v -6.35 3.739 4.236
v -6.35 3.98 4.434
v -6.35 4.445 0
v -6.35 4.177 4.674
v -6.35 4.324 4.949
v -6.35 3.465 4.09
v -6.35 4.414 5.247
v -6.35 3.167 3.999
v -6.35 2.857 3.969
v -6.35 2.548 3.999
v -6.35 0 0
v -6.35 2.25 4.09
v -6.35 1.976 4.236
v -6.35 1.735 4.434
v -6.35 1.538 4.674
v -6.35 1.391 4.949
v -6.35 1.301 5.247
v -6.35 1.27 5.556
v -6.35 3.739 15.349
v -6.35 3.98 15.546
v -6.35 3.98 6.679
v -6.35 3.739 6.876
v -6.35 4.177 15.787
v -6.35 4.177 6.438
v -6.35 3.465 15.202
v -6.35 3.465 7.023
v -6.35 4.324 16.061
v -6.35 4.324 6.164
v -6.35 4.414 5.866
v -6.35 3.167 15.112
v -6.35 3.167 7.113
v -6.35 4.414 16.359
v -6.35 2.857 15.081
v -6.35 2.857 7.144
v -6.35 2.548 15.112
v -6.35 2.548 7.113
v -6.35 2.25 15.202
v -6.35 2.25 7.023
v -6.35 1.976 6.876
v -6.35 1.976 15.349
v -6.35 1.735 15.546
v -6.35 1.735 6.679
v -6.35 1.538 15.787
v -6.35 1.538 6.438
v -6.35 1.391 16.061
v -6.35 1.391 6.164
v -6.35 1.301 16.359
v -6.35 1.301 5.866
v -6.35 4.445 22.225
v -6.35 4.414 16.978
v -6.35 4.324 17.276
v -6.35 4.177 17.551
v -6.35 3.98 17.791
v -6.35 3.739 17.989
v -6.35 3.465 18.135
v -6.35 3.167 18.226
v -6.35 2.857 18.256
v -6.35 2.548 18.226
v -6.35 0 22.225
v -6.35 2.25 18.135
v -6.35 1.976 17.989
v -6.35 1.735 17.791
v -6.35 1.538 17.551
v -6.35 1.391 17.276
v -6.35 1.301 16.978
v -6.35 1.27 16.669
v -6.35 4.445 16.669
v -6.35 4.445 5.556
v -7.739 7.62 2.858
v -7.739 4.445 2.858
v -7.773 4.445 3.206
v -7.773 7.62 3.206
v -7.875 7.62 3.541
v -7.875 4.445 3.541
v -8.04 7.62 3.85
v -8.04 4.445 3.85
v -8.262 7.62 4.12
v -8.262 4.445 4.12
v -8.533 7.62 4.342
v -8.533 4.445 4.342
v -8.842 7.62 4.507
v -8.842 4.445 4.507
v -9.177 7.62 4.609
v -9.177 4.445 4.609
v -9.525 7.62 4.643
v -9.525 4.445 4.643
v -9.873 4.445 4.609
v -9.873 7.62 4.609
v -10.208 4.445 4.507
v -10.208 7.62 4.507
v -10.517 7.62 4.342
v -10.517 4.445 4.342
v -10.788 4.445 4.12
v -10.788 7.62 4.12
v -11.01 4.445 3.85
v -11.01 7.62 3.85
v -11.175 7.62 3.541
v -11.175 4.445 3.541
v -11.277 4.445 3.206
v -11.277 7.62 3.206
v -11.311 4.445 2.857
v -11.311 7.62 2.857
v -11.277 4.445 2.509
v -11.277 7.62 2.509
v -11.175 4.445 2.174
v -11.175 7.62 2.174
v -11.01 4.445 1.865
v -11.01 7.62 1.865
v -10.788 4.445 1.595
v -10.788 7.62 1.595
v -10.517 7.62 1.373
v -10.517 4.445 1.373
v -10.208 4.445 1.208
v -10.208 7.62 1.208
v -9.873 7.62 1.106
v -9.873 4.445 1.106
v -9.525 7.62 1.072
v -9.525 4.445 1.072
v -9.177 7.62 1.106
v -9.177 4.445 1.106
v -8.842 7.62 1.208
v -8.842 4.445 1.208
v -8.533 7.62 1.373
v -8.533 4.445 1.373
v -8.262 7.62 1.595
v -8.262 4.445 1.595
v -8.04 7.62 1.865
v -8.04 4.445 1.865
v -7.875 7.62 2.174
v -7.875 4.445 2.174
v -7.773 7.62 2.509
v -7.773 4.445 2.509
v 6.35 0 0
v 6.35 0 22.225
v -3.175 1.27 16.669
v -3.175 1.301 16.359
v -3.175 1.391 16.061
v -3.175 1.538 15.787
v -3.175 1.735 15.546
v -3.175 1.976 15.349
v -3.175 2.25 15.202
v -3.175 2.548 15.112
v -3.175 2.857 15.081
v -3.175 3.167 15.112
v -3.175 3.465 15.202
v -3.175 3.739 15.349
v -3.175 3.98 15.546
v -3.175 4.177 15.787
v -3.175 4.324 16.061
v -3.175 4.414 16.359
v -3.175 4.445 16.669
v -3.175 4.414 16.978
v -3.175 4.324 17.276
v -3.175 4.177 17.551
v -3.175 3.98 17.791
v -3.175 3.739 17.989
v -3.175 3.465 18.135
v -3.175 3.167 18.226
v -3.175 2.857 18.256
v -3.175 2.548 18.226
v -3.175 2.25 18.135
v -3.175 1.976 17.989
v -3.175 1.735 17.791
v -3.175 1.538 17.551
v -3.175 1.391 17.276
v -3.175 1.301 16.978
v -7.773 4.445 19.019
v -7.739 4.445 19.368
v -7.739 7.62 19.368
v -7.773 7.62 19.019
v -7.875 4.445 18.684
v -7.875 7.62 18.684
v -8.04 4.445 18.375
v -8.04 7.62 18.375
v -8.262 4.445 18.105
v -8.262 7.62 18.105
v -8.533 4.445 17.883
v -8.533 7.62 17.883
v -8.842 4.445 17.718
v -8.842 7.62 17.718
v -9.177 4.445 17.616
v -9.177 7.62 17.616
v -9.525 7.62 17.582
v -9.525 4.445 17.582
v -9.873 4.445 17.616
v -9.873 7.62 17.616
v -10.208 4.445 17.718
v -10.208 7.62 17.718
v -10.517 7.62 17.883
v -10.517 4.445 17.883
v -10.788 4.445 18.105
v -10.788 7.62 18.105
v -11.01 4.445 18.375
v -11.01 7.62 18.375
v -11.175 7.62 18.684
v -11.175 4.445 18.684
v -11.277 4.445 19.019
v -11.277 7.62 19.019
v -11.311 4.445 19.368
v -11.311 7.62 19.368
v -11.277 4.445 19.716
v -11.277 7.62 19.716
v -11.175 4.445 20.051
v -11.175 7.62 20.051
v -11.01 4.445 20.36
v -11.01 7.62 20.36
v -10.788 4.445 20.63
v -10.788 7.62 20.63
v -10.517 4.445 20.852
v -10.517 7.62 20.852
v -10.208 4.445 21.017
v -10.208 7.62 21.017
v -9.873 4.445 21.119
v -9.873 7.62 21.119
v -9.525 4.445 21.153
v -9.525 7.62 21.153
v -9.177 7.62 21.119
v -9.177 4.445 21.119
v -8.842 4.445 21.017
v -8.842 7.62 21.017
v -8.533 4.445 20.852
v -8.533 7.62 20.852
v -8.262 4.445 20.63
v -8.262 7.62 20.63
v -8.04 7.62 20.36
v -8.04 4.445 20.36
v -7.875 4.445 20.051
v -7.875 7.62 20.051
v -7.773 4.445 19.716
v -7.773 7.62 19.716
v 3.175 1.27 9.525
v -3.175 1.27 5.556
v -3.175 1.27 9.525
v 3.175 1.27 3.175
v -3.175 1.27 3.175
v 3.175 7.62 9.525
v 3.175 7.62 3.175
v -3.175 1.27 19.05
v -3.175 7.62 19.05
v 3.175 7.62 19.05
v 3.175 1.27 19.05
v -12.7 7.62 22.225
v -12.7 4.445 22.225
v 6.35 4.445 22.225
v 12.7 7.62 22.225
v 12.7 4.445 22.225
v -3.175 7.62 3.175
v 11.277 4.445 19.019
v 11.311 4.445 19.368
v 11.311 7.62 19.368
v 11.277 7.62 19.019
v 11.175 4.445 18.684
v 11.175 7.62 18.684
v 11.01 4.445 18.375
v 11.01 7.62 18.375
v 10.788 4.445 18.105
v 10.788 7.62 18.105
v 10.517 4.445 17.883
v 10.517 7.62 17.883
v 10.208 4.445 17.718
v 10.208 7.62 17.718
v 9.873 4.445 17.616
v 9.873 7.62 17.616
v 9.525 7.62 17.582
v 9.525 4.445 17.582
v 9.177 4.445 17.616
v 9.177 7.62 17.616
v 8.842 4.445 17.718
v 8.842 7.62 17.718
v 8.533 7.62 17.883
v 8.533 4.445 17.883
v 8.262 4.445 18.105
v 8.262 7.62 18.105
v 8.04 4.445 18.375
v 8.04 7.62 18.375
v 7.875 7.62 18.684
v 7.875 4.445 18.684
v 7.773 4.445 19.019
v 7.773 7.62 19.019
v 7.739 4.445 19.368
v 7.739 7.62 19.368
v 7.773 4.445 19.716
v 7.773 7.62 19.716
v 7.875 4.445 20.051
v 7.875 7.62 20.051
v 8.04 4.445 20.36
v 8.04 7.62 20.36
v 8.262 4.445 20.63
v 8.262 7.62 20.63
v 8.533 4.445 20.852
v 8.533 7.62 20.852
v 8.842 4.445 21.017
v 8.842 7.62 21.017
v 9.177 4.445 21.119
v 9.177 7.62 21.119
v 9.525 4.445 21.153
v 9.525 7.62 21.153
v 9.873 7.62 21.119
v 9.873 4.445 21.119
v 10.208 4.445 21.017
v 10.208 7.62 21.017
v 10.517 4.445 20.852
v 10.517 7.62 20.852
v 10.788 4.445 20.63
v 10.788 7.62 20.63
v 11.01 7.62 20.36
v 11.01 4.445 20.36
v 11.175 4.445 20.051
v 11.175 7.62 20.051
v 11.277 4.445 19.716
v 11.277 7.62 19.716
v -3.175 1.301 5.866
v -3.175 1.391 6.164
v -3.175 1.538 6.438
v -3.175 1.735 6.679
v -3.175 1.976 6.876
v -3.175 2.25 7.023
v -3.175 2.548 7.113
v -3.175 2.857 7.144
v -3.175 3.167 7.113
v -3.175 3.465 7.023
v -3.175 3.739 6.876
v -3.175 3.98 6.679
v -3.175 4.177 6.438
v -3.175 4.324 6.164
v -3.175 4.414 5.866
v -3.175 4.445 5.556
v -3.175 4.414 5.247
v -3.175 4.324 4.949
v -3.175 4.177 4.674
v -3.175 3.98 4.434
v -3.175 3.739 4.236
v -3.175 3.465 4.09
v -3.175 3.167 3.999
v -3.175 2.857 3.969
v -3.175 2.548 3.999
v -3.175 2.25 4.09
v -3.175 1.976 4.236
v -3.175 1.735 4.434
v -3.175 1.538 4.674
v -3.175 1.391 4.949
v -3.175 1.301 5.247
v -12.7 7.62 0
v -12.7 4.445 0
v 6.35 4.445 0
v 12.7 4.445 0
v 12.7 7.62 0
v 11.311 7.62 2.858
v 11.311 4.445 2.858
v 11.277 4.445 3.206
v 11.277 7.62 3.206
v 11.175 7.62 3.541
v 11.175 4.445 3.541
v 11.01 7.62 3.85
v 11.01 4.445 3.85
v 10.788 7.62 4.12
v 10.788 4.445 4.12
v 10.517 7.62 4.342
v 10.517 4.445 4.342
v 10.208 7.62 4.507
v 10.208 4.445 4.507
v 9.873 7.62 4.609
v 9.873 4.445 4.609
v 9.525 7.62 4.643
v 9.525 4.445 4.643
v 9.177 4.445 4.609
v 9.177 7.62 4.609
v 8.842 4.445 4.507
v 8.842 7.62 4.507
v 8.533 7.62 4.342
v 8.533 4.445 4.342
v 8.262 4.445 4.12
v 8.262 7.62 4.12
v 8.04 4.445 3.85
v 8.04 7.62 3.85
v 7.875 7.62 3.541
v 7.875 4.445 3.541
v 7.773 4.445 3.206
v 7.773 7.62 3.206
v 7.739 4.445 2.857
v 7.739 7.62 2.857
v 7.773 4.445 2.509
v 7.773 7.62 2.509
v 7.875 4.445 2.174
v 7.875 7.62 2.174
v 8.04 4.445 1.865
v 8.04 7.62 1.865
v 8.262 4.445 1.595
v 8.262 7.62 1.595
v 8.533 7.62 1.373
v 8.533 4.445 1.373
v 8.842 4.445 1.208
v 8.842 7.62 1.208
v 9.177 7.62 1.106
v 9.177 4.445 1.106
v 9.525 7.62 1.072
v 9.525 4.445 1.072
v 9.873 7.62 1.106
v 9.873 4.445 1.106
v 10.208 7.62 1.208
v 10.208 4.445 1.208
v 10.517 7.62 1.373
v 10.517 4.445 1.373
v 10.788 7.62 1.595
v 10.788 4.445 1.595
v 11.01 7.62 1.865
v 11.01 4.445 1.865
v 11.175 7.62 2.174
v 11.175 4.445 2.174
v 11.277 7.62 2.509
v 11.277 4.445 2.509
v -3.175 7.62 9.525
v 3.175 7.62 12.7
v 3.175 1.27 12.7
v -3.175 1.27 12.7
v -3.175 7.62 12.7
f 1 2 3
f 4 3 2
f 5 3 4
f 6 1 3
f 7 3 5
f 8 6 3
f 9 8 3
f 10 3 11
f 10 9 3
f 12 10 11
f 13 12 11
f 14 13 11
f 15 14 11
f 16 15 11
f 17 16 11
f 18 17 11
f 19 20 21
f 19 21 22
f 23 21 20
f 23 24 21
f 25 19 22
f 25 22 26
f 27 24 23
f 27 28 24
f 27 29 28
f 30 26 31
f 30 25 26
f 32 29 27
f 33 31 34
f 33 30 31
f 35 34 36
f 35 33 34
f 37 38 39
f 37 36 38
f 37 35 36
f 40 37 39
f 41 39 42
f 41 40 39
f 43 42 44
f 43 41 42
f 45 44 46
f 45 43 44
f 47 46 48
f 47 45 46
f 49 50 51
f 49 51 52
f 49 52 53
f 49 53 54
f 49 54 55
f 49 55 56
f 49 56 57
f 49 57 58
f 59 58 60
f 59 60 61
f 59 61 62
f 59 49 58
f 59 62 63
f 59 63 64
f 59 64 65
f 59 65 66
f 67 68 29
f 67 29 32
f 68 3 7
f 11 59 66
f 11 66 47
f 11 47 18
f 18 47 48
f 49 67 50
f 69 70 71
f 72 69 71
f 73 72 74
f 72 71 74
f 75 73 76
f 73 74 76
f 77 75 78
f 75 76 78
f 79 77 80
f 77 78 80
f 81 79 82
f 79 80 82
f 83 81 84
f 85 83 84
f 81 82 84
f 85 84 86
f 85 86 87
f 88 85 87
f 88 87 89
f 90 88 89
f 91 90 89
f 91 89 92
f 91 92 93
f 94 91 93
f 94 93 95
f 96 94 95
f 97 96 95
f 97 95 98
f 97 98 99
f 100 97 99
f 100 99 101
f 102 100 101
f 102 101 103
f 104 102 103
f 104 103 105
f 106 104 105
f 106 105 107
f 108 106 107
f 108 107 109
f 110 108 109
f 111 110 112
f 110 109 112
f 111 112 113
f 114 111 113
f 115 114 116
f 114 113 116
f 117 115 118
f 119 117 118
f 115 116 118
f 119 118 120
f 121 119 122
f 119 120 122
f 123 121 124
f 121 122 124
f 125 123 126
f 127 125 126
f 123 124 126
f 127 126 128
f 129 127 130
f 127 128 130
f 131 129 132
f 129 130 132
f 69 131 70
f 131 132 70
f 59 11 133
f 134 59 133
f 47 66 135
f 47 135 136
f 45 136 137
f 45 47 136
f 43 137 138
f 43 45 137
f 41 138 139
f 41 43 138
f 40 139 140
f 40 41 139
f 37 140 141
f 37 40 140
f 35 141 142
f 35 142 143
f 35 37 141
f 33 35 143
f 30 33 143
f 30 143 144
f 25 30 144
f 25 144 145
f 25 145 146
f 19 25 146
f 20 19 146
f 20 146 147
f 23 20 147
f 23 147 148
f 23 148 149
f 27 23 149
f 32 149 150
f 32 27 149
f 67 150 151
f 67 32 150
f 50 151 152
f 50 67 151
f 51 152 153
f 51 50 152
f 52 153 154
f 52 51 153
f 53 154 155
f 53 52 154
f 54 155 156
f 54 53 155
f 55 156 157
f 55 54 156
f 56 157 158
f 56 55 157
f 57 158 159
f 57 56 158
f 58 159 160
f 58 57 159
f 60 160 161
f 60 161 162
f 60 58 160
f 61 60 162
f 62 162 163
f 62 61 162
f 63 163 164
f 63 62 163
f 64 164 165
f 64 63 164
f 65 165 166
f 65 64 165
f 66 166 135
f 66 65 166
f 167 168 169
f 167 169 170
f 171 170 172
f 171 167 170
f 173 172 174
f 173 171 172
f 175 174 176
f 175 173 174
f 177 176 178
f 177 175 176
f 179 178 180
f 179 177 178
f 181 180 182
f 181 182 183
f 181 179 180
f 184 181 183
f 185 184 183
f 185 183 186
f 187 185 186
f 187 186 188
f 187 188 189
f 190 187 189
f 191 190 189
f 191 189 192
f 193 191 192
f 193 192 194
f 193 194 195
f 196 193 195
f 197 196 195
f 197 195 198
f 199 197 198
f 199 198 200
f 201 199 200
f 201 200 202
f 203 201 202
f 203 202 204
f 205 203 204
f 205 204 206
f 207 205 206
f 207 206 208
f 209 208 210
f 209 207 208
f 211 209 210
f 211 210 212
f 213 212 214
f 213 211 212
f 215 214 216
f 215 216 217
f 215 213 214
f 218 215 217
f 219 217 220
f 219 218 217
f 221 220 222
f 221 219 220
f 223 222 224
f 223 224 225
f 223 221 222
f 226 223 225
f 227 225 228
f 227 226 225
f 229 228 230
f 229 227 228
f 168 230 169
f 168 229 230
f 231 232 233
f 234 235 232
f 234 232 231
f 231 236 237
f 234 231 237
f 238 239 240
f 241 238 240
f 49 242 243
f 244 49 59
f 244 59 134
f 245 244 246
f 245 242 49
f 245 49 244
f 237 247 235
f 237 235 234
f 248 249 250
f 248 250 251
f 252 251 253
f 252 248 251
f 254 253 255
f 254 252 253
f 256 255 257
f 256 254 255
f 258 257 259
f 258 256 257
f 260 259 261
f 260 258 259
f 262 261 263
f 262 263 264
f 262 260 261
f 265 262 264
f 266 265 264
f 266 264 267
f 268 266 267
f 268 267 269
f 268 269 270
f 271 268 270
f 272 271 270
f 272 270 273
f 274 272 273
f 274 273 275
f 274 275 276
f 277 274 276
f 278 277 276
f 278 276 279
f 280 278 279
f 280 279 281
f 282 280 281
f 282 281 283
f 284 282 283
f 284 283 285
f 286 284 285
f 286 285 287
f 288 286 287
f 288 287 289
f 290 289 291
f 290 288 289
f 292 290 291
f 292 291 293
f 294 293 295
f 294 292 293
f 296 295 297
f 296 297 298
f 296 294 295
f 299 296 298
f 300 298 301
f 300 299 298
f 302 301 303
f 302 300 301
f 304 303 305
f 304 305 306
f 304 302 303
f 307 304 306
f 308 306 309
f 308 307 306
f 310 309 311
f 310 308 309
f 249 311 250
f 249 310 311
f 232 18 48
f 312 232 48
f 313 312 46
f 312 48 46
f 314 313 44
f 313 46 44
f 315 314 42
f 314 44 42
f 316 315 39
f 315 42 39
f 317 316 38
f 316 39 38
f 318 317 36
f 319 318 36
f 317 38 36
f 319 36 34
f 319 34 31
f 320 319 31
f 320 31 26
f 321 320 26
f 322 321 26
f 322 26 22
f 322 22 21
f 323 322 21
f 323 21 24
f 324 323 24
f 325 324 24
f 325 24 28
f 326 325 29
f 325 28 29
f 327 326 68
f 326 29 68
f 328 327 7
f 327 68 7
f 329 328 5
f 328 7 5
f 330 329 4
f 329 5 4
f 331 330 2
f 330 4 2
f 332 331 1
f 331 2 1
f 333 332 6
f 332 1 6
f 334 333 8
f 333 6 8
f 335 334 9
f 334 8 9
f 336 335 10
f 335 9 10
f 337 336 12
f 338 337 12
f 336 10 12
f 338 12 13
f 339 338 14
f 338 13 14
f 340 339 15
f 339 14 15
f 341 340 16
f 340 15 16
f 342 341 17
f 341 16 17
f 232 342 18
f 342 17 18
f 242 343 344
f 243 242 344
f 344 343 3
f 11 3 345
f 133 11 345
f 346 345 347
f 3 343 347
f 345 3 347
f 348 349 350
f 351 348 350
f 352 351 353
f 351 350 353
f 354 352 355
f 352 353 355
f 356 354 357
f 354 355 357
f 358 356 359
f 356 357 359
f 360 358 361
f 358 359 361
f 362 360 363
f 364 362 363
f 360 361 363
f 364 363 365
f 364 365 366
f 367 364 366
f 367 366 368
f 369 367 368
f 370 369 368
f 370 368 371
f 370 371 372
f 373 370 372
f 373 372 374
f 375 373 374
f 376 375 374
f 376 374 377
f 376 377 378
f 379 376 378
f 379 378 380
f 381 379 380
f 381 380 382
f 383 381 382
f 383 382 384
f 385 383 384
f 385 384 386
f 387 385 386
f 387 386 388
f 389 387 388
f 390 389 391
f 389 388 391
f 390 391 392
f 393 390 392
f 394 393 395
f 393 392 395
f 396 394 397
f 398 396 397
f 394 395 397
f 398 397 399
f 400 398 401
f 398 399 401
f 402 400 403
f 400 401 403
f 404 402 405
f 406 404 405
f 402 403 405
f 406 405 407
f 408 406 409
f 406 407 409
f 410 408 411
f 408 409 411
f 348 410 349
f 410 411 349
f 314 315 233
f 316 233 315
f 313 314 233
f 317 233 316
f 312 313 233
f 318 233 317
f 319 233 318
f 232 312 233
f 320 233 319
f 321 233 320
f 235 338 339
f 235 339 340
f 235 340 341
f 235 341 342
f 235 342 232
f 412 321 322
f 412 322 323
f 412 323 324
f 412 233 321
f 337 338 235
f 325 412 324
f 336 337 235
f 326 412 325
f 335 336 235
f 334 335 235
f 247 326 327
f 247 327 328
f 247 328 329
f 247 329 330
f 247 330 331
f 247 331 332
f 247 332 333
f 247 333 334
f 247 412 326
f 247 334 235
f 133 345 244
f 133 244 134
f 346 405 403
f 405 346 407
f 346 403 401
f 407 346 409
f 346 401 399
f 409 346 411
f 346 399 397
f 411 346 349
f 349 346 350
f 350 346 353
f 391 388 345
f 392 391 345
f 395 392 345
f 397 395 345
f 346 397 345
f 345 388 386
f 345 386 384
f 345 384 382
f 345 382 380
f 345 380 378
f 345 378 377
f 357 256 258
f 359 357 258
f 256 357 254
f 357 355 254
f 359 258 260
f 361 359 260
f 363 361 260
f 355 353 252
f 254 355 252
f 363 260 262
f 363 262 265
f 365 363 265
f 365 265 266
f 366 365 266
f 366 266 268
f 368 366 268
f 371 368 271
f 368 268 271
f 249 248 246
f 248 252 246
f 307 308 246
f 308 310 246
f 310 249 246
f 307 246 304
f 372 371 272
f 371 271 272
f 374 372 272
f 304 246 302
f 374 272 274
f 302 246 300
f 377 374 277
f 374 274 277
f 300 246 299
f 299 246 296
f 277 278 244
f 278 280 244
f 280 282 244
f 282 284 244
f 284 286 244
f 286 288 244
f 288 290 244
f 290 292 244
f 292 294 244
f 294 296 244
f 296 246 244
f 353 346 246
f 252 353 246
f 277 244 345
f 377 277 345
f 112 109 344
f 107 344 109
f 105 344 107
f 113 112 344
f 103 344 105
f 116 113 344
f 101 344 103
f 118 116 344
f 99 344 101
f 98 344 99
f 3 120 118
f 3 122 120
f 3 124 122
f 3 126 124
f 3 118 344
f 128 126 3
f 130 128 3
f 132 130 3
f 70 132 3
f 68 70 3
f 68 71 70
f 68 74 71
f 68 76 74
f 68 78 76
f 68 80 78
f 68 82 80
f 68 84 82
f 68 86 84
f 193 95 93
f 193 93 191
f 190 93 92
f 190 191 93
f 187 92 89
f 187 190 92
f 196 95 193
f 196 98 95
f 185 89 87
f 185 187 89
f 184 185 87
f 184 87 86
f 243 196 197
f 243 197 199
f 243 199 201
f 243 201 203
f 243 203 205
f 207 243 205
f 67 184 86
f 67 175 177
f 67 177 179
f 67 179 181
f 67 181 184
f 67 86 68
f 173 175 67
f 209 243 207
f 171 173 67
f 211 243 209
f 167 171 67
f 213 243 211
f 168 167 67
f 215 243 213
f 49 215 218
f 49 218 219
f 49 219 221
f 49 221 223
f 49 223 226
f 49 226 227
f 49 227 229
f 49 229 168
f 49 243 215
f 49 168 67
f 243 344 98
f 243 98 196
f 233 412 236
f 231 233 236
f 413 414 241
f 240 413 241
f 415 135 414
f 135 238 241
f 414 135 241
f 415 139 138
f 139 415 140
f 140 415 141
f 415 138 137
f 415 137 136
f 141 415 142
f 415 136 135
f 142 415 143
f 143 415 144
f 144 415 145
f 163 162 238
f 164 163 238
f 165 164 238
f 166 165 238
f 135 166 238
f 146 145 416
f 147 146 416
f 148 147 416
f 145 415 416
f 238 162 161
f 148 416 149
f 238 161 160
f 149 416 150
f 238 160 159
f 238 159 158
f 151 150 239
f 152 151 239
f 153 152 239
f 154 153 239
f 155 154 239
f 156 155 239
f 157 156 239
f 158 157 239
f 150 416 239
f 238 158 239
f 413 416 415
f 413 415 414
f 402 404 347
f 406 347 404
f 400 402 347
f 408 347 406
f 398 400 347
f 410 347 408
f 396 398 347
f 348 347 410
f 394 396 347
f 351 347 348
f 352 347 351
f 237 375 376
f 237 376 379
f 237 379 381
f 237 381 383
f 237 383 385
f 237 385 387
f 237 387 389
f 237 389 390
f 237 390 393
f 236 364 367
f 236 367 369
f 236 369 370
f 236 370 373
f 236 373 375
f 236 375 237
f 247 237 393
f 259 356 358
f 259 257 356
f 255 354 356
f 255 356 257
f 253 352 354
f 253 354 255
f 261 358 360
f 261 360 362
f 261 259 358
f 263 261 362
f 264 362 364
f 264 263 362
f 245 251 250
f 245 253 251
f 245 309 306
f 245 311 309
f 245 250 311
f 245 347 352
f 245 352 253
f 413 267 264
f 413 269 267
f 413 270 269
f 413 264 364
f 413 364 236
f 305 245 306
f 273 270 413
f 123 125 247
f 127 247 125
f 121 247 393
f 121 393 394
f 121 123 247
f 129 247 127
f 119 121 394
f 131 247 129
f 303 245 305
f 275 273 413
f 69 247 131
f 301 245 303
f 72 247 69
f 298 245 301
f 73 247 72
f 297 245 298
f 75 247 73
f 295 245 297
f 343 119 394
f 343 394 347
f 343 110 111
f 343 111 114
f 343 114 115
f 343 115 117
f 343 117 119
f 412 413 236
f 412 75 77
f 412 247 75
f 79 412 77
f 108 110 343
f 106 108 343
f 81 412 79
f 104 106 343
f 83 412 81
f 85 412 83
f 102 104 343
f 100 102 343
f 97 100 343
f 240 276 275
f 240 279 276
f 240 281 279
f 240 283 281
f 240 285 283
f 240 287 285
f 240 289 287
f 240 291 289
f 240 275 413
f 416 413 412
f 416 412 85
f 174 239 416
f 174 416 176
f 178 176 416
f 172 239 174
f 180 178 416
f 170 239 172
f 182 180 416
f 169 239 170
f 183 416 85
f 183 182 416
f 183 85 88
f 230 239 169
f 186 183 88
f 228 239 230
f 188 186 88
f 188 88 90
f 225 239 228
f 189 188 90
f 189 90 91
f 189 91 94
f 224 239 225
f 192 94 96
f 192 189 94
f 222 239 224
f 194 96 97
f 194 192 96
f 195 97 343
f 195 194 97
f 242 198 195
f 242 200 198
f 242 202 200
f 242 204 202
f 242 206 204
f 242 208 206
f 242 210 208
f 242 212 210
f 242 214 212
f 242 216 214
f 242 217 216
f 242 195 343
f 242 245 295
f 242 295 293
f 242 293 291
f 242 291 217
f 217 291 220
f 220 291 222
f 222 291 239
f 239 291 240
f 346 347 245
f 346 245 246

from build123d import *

# Parameters (mm, degrees)
BOSS_EXTRUDE1_DEPTH = 11.1125
SKETCH3_W           = 6.35
SKETCH3_H           = 6.35
CUT_EXTRUDE1_DEPTH  = 6.35
SKETCH2_R           = 1.5875
CUT_EXTRUDE2_DEPTH  = 3.175
CUT_EXTRUDE3_REACH  = 19.451
SKETCH4_R           = 1.7859375


with BuildPart() as part:
    # Sketch1 → Boss-Extrude1 (new body)
    with BuildSketch(Plane.XY):
        Polygon((0, 0), (0, 7.62), (12.7, 7.62), (12.7, 4.445), (6.35, 4.445), (6.35, 0), align=None)
    extrude(amount=BOSS_EXTRUDE1_DEPTH)

    # Mirror1: part across plane


with BuildPart() as part_1:
    add(part.part)
    add(part.part.mirror(Plane(origin=(0, 0, 11.1125), x_dir=(0, 0, 1), z_dir=(-1, 0, 0))))

    # Sketch3 → Cut-Extrude1 (cut)
    with BuildSketch(Plane(origin=(0, 7.62, 0), x_dir=(1, 0, 0), z_dir=(0, 1, 0))):
        with Locations((0, -6.35)):
            Rectangle(SKETCH3_W, SKETCH3_H)
    extrude(amount=-CUT_EXTRUDE1_DEPTH, mode=Mode.SUBTRACT)

    # Sketch2 → Cut-Extrude2 (cut)
    with BuildSketch(Plane.ZY.offset(6.35)):
        with Locations(Location((5.55625, 2.8575, 0), (0, 0, 270))):
            Circle(SKETCH2_R)
    extrude(amount=-CUT_EXTRUDE2_DEPTH, mode=Mode.SUBTRACT)

    # Sketch4 → Cut-Extrude3 (cut, up to next)
    with BuildSketch(Plane.XZ.offset(-4.445), mode=Mode.PRIVATE) as cut_extrude3_sk1:
        with Locations((9.525, 2.8575)):
            Circle(SKETCH4_R)
    cut_extrude3_tool1 = extrude(cut_extrude3_sk1.sketch, amount=-CUT_EXTRUDE3_REACH, mode=Mode.PRIVATE) & part_1.part
    # Sketch4 → Cut-Extrude3 (cut, up to next)
    with BuildSketch(Plane.XZ.offset(-4.445), mode=Mode.PRIVATE) as cut_extrude3_sk2:
        with Locations((-9.525, 2.8575)):
            Circle(SKETCH4_R)
    cut_extrude3_tool2 = extrude(cut_extrude3_sk2.sketch, amount=-CUT_EXTRUDE3_REACH, mode=Mode.PRIVATE) & part_1.part
    add(cut_extrude3_tool1.solids().sort_by_distance((9.525, 4.445, 2.8575))[0], mode=Mode.SUBTRACT)
    add(cut_extrude3_tool2.solids().sort_by_distance((-9.525, 4.445, 2.8575))[0], mode=Mode.SUBTRACT)

    # Mirror2: part across plane


with BuildPart() as part_2:
    add(part_1.part)
    add(part_1.part.mirror(Plane(origin=(0, 0, 11.1125), x_dir=(1, 0, 0), z_dir=(0, 0, -1))))


solid = part_2.part
